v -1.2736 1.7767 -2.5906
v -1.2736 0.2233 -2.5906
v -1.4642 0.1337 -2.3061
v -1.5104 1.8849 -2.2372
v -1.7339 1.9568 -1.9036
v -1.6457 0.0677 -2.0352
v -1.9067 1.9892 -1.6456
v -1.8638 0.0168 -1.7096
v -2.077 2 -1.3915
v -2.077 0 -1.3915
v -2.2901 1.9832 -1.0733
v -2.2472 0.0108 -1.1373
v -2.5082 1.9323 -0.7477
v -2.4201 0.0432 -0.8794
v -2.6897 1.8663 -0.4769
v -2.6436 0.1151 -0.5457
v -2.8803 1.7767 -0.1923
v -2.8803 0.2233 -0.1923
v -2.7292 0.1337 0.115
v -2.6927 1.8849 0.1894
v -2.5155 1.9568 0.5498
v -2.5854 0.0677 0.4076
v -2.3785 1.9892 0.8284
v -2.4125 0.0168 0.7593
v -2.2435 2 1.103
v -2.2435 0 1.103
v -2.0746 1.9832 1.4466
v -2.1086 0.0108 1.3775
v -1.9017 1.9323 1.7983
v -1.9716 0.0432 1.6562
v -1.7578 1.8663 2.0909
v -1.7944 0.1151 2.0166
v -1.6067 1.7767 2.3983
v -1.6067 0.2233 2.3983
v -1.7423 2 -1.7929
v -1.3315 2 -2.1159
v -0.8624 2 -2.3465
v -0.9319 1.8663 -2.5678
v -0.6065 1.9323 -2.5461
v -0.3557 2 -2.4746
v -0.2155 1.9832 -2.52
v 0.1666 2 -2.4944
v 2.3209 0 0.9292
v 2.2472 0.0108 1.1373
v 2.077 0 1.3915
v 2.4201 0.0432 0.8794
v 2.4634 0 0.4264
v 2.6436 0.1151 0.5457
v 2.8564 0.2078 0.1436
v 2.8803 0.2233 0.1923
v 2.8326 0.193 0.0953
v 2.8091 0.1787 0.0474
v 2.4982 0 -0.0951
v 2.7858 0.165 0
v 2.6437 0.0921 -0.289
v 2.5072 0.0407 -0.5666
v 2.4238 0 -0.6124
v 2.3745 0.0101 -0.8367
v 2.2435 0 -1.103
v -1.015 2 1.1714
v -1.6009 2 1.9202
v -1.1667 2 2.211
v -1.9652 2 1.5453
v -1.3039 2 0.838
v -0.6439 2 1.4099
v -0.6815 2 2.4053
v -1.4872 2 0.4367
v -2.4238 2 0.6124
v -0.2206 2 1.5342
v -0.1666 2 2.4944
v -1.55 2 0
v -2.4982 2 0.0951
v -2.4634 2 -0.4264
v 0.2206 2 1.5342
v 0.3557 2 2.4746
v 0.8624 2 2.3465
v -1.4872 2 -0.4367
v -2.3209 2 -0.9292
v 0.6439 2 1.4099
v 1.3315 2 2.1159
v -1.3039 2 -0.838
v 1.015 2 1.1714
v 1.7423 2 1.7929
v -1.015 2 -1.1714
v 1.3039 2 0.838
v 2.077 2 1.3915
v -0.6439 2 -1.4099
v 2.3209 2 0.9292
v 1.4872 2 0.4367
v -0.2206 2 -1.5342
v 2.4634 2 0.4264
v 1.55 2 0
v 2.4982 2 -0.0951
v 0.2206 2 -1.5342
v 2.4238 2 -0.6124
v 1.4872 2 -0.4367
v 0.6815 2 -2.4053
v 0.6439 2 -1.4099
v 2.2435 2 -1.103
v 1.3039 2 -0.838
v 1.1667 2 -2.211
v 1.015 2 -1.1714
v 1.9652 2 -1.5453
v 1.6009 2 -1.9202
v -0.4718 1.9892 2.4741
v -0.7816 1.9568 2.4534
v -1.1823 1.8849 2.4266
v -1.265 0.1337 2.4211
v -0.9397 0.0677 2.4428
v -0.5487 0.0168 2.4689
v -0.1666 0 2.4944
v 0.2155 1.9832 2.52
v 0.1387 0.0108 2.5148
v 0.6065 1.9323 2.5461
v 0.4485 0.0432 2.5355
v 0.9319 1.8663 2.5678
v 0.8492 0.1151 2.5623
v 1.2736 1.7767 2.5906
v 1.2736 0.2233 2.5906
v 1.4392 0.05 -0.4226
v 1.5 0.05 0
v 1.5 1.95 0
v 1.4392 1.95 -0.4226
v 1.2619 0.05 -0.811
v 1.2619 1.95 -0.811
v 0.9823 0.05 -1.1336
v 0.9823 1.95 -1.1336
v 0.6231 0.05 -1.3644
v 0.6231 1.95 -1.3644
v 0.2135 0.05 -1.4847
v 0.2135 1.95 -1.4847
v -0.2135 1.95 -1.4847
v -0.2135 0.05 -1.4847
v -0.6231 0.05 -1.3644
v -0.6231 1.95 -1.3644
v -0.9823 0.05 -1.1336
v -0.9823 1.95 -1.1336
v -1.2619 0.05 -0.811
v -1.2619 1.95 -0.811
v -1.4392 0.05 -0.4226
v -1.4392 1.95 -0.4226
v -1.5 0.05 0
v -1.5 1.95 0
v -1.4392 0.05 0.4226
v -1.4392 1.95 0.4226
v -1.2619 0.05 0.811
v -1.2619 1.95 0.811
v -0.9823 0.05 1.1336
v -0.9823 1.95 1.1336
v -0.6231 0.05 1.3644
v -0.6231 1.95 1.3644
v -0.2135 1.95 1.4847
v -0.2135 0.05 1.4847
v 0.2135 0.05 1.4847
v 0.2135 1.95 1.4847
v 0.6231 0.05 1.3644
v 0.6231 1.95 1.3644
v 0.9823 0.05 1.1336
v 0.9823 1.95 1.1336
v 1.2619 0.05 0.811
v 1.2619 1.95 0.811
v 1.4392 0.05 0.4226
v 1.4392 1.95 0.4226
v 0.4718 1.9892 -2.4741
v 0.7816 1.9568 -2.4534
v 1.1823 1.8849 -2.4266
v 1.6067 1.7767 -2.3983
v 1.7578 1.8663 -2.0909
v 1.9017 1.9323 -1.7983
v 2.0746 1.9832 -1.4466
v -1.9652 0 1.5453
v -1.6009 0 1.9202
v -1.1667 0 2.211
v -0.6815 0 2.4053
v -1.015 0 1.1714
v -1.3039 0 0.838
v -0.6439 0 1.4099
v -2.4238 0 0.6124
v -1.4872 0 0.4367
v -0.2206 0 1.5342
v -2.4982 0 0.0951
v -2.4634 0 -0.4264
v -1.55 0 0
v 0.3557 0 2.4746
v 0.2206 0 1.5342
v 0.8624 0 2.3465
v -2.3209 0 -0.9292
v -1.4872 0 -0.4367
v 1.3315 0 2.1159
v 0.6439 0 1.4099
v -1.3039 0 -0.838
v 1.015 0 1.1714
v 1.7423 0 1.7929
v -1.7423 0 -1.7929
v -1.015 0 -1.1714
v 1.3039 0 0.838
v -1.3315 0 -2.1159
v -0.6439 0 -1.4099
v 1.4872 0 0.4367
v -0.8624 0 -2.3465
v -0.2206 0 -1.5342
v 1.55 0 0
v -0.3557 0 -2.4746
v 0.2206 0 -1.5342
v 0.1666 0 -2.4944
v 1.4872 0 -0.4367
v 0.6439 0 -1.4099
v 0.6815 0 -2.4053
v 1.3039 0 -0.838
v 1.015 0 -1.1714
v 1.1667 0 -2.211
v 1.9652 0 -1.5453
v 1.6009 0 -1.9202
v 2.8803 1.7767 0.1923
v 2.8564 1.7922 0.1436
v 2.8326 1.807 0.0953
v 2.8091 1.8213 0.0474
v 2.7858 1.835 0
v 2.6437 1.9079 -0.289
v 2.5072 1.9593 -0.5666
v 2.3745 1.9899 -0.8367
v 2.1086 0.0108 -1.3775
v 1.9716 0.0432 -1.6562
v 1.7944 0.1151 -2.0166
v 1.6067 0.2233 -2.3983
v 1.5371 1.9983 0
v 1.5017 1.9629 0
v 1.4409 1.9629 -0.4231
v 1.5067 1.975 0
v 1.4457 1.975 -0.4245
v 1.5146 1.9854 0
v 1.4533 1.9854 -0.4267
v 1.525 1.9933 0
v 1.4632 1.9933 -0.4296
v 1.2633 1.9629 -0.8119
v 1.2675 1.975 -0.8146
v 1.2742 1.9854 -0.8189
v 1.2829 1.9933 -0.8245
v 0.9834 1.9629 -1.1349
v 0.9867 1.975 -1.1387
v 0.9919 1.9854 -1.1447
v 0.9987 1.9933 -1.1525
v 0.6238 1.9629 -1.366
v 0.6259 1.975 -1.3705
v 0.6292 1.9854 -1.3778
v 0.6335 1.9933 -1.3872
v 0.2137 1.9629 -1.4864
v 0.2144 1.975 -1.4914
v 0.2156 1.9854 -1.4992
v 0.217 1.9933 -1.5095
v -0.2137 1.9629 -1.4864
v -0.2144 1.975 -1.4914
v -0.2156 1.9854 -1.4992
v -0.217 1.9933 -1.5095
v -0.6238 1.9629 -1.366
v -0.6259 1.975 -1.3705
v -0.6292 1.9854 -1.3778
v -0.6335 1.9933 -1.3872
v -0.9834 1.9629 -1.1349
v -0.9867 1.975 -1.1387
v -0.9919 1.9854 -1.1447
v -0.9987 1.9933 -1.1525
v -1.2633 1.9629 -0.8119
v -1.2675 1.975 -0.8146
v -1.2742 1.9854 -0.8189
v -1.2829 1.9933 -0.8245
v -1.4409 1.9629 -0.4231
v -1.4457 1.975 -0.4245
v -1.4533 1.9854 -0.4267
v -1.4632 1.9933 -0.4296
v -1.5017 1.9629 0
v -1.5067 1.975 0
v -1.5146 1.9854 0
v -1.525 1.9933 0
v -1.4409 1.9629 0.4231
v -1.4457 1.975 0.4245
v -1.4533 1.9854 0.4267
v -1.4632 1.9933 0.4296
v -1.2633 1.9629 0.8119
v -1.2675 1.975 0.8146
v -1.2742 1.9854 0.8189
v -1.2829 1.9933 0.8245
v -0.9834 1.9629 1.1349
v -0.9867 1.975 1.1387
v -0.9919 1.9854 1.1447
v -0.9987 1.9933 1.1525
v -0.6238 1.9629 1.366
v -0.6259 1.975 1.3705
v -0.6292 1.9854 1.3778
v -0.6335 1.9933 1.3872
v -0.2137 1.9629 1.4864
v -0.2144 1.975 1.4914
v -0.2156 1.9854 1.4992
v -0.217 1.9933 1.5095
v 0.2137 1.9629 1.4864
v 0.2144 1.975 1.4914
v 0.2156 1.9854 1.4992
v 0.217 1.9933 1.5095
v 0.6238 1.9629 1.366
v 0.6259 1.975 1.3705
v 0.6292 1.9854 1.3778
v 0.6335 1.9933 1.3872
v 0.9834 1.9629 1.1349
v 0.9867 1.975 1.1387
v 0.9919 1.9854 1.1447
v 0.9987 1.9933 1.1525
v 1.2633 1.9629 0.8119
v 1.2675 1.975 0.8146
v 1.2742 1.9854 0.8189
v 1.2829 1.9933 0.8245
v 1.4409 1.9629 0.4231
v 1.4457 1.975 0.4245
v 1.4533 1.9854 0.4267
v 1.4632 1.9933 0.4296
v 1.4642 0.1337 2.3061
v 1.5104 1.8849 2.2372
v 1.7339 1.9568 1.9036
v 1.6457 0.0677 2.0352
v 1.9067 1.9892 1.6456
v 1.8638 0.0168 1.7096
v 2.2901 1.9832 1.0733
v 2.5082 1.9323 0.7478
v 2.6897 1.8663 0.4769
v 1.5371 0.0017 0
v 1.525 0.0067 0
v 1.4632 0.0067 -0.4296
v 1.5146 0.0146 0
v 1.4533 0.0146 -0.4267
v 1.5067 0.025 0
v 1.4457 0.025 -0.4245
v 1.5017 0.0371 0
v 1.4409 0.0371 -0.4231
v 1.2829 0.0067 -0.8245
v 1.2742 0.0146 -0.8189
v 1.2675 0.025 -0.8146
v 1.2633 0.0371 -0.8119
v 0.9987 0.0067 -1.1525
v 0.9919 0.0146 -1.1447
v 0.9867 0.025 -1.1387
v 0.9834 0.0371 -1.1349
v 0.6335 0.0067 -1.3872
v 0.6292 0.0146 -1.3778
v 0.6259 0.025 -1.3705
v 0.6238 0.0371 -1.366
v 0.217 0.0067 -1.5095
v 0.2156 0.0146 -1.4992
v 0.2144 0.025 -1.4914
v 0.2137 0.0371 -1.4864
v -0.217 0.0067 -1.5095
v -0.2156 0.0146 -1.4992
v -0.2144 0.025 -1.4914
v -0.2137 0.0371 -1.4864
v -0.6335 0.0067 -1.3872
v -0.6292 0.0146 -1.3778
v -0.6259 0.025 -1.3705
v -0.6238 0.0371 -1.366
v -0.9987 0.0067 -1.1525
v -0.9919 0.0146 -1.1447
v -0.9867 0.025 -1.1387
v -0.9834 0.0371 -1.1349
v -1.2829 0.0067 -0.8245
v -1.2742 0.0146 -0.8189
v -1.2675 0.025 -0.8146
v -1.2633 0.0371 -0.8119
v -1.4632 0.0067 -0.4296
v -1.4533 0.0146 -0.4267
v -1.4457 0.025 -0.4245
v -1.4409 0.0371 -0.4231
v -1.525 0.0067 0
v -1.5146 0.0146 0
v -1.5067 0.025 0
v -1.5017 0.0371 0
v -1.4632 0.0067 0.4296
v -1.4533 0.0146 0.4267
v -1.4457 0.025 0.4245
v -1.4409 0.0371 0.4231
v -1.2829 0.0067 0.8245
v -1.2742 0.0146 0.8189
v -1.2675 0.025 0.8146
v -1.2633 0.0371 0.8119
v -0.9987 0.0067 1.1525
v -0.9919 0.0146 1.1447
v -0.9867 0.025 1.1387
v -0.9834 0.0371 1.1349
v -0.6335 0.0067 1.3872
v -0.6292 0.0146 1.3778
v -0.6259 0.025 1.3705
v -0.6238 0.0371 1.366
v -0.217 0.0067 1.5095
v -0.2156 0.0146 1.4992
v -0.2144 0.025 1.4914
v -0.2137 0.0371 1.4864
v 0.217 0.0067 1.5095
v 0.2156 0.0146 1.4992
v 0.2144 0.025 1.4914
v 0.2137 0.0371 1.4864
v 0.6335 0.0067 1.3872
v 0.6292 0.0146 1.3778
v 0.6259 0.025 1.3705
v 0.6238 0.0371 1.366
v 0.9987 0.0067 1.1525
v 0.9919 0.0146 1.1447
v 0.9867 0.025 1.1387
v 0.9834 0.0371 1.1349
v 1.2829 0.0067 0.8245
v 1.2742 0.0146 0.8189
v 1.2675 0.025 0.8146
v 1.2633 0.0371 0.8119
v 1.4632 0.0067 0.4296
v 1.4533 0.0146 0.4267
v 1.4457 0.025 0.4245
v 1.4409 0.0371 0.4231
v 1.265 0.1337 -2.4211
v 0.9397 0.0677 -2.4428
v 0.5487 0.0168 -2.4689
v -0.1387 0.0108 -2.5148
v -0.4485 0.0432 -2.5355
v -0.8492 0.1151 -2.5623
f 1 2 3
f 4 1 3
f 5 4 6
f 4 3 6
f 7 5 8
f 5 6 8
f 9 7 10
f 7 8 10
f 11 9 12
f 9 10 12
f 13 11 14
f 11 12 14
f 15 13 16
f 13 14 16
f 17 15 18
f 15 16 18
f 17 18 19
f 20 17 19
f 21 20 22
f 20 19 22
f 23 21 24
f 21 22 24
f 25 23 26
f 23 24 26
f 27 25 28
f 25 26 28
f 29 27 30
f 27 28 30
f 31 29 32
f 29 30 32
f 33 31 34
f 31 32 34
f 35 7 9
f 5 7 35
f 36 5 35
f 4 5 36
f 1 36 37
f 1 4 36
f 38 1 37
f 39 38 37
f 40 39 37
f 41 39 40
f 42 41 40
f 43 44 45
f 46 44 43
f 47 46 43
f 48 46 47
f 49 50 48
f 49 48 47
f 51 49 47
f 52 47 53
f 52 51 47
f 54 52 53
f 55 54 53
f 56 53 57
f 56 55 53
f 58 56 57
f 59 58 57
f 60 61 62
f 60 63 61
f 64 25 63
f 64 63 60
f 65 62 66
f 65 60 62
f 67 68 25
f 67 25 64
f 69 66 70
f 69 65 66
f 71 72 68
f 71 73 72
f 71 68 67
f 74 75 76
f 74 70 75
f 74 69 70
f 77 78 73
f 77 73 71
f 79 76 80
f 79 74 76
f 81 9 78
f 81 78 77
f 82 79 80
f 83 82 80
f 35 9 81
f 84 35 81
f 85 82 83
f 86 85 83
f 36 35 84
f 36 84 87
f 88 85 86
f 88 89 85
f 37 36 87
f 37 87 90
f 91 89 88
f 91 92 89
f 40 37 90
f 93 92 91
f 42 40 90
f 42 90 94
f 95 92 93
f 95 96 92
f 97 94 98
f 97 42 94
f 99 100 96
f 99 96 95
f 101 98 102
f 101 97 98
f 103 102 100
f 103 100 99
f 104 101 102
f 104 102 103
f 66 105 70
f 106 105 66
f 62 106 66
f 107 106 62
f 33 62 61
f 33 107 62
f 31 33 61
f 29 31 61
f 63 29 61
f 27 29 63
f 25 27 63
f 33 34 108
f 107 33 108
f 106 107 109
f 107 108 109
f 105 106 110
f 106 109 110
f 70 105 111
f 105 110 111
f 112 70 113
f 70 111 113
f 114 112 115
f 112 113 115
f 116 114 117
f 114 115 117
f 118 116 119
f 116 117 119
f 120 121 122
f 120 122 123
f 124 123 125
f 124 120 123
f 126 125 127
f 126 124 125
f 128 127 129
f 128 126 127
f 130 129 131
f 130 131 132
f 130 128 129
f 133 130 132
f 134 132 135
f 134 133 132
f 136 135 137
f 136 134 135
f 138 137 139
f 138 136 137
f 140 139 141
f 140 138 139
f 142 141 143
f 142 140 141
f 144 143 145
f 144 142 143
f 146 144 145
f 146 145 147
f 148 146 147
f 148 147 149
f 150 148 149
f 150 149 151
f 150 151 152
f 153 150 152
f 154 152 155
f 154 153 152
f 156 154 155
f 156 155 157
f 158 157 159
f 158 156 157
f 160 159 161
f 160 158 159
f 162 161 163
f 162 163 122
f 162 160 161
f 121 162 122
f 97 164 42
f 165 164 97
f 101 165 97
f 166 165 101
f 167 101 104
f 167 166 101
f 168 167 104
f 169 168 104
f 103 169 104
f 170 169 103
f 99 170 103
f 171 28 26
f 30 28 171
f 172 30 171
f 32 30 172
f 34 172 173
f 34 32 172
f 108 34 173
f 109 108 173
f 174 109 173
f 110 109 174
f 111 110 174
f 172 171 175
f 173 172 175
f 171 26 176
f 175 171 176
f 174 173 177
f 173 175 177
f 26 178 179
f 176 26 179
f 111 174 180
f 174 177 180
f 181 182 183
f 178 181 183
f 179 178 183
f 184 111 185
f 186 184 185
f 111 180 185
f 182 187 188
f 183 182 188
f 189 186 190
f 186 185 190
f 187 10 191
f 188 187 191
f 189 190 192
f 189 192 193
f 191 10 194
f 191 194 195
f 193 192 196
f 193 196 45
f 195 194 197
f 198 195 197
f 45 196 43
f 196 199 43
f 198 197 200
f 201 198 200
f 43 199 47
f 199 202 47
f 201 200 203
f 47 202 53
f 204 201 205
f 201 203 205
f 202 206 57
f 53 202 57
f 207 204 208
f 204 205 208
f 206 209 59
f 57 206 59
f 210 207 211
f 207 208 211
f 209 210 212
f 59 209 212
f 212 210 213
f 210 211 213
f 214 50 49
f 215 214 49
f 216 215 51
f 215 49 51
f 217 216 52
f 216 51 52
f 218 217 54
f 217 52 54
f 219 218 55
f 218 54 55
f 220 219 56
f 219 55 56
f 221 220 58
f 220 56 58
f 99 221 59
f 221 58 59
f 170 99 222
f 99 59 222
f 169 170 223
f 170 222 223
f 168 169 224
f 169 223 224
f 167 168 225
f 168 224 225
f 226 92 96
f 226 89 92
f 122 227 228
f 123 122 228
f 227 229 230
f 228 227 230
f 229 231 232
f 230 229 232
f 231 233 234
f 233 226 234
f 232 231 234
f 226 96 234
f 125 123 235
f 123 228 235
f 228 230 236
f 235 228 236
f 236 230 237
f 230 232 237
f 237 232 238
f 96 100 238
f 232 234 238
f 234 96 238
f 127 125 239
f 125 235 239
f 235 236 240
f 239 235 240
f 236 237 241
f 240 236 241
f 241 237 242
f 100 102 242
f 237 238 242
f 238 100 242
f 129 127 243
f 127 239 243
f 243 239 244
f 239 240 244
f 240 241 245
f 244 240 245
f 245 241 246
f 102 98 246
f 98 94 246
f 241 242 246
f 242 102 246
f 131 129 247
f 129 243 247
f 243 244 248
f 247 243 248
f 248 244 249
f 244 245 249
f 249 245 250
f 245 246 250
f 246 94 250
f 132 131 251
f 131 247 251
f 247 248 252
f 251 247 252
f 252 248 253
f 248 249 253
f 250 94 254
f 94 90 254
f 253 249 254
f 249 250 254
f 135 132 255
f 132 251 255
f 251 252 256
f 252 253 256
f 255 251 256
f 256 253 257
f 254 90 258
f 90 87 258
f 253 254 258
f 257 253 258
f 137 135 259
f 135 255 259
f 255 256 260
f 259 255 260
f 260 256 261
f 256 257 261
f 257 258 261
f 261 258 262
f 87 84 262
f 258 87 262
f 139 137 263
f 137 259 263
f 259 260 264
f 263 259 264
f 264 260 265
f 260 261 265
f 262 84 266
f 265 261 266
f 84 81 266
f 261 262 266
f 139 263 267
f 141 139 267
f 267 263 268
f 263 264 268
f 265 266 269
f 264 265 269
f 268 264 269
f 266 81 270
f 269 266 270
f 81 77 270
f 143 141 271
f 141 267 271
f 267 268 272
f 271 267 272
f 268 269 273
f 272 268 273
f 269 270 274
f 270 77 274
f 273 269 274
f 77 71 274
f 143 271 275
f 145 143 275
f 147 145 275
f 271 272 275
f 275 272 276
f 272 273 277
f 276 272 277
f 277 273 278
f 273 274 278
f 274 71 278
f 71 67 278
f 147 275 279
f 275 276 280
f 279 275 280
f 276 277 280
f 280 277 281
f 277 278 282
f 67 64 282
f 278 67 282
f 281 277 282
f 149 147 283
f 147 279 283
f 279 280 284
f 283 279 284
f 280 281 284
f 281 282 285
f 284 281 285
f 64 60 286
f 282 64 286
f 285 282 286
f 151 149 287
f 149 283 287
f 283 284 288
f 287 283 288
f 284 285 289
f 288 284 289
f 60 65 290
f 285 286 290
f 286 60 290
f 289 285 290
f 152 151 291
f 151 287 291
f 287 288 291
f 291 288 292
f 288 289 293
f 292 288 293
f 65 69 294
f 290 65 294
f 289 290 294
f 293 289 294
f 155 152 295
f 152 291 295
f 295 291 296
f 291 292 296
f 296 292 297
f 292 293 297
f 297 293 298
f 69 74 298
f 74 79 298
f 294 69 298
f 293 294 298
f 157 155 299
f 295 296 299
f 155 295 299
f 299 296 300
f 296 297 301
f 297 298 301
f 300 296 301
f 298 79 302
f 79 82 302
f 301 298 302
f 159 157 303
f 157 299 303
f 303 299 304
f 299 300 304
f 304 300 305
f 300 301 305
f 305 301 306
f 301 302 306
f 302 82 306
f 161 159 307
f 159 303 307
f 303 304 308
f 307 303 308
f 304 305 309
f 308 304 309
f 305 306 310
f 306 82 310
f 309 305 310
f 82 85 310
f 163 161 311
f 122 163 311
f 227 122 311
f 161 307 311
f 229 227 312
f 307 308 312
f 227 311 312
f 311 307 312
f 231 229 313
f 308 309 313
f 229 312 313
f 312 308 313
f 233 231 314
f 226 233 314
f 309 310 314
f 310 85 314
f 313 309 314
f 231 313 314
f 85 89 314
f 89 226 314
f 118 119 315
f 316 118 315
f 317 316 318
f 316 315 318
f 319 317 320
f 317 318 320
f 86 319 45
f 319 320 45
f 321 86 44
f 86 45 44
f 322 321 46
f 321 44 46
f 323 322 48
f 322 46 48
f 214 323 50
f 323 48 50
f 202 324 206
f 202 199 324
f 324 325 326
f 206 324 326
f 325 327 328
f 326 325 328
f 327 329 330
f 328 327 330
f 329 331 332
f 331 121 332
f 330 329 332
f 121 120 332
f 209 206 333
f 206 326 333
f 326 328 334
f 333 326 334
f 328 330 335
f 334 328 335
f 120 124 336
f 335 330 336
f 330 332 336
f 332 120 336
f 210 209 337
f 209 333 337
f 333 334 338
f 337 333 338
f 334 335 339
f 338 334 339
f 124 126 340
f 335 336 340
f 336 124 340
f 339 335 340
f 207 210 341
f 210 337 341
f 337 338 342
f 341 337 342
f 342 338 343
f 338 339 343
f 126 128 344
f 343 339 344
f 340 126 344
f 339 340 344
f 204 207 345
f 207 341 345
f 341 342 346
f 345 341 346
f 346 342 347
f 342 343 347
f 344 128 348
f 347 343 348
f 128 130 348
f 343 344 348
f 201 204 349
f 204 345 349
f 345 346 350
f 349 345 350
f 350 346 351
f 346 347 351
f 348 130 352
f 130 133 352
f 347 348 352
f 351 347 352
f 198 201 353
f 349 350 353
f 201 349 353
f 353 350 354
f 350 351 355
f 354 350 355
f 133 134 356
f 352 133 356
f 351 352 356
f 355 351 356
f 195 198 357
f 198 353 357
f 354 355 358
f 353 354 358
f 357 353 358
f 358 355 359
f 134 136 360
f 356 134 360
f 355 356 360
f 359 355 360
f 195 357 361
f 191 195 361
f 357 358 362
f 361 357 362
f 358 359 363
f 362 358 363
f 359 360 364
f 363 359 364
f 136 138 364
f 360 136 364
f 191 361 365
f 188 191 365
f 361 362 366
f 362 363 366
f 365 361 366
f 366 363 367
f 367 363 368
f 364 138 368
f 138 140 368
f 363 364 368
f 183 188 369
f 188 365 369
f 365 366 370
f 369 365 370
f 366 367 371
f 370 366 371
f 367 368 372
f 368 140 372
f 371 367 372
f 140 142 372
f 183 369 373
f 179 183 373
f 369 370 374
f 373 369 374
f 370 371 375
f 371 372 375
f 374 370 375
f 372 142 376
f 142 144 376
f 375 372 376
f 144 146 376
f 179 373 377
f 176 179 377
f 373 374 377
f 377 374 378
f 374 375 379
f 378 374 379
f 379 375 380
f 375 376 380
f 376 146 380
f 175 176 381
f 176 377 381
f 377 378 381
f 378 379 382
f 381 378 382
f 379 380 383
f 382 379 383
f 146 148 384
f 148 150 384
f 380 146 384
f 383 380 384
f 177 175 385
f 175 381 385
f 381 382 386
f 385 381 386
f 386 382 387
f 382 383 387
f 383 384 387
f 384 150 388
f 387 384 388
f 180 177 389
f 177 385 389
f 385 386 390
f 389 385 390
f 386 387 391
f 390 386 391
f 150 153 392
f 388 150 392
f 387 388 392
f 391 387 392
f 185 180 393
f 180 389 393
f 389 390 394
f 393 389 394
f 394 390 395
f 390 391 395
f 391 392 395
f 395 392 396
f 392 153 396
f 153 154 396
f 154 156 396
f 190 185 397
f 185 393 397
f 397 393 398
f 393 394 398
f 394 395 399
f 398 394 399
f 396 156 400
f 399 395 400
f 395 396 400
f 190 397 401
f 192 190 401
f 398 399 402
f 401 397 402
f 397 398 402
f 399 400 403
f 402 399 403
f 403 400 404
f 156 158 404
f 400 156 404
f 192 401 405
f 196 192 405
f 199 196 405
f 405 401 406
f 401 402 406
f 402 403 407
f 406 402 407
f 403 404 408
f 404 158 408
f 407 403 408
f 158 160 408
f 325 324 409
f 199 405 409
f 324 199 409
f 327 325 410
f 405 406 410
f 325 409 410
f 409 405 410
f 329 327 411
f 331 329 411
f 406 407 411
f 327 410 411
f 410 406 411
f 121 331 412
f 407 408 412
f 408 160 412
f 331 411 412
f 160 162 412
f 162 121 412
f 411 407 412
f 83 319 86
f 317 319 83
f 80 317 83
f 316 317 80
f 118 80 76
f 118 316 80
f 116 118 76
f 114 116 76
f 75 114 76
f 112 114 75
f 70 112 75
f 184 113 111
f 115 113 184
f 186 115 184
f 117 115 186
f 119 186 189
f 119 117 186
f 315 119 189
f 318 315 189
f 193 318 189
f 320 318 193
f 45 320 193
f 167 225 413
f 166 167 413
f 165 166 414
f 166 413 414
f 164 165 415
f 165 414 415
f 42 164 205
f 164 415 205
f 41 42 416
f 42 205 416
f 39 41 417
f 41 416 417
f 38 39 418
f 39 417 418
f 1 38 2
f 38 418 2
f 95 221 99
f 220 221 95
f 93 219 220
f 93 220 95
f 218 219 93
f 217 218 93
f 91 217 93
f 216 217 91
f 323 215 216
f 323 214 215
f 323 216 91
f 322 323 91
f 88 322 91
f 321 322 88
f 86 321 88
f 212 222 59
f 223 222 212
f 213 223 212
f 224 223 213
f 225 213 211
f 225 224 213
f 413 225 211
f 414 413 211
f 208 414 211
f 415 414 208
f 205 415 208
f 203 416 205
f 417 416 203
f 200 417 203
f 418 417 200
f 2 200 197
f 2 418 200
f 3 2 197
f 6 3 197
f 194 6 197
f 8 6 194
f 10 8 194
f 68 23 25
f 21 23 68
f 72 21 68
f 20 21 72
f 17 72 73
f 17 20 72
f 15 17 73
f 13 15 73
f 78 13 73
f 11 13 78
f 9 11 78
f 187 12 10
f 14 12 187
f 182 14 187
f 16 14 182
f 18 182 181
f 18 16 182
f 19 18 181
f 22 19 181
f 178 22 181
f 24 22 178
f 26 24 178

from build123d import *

# Parameters (mm, degrees)
SKETCH1_R           = 1.5
BOSS_EXTRUDE1_DEPTH = 2
SKETCH2_OUTSIDE_W   = 16.288
SKETCH2_OUTSIDE_H   = 15.71
SKETCH2_OUTSIDE_R   = 2.5
CUT_EXTRUDE1_DEPTH  = 2
CUT_EXTRUDE1_TAPER  = 60
SKETCH3_OUTSIDE_W   = 16.288
SKETCH3_OUTSIDE_H   = 15.71
SKETCH3_OUTSIDE_R   = 2.5
CUT_EXTRUDE2_DEPTH  = 2
CUT_EXTRUDE2_TAPER  = 60
FILLET1_R           = 0.05


with BuildPart() as part:
    # Sketch1 → Boss-Extrude1 (new body)
    with BuildSketch(Plane(origin=(0, 0, 0), x_dir=(1, 0, 0), z_dir=(0, 1, 0))):
        Polygon((-2.880337842, 0.192320694), (-1.606723528, -2.398285395), (1.273614314, -2.59060609), (2.880337842, -0.192320694), (1.606723528, 2.398285395), (-1.273614314, 2.59060609), align=None)
        Circle(SKETCH1_R, mode=Mode.SUBTRACT)
    extrude(amount=BOSS_EXTRUDE1_DEPTH)

    # Sketch2 outside → Cut-Extrude1 (cut)
    with BuildSketch(Plane(origin=(0, 2, 0), x_dir=(1, 0, 0), z_dir=(0, 1, 0))):
        Rectangle(SKETCH2_OUTSIDE_W, SKETCH2_OUTSIDE_H)
        Circle(SKETCH2_OUTSIDE_R, mode=Mode.SUBTRACT)
    extrude(amount=-CUT_EXTRUDE1_DEPTH, taper=CUT_EXTRUDE1_TAPER, mode=Mode.SUBTRACT)

    # Sketch3 outside → Cut-Extrude2 (cut)
    with BuildSketch(Plane.XZ):
        Rectangle(SKETCH3_OUTSIDE_W, SKETCH3_OUTSIDE_H)
        Circle(SKETCH3_OUTSIDE_R, mode=Mode.SUBTRACT)
    extrude(amount=-CUT_EXTRUDE2_DEPTH, taper=CUT_EXTRUDE2_TAPER, mode=Mode.SUBTRACT)

    # Fillet1
    fillet1_edges = [part.edges().sort_by_distance(p)[0] for p in [
        (-1.5, 0, 0),
        (-1.5, 2, 0),
    ]]
    fillet(fillet1_edges, radius=FILLET1_R)


solid = part.part
